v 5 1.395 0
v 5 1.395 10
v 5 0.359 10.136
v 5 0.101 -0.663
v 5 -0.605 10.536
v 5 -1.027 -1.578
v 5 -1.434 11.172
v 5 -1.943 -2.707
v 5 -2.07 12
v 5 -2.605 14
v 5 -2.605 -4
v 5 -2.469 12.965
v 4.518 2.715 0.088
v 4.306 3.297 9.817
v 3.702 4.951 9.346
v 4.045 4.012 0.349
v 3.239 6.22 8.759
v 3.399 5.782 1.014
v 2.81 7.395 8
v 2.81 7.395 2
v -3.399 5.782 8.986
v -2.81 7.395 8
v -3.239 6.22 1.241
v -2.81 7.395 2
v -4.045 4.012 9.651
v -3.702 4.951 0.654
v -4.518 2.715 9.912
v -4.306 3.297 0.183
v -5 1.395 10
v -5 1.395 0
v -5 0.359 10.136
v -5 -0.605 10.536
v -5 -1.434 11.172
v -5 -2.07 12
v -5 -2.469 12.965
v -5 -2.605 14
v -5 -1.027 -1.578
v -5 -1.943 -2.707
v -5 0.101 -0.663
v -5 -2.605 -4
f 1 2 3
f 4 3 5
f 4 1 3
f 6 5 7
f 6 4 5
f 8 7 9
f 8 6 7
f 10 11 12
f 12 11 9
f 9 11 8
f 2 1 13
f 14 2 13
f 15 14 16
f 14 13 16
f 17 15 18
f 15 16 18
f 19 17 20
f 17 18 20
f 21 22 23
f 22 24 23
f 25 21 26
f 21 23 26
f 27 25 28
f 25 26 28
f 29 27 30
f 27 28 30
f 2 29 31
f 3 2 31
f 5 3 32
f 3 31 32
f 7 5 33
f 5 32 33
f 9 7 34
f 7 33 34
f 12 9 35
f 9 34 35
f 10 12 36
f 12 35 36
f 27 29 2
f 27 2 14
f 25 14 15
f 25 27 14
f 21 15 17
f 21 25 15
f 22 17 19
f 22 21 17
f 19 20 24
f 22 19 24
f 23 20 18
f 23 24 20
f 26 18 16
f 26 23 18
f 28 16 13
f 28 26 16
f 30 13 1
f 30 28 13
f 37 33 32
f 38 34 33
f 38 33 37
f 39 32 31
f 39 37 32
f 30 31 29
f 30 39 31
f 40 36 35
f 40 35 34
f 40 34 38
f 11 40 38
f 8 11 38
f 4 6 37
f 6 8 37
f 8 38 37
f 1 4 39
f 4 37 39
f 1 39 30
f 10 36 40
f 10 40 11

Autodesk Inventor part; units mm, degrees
ref_plane "YZ Plane" through (0, 0, 0) normal (1, 0, 0) x (0, 1, 0)
ref_plane "XZ Plane" through (0, 0, 0) normal (0, 1, 0) x (-1, 0, 0)
ref_plane "XY Plane" through (0, 0, 0) normal (0, 0, 1) x (1, 0, 0)
sketch "Sketch1" plane through (0, 0, 0) normal (0, 0, 1) x (1, 0, 0)
  line L0 (-5, -2.6054) -> (-5, 1.3946)
  line L1 (-5, -2.6054) -> (0, -2.6054)
  line L2 (0, -2.6054) -> (0, 7.3946)
  line L3 (0, 7.3946) -> (-2.8105, 7.3946)
  line L4 (-2.8105, 7.3946) -> (-5, 1.3946)
  point P0 (0, 0)
  dimension "d0" = 4
  dimension "d1" = 6
  dimension "d2" = 5
extrude "Extrusion1" add sketch "Sketch1" along normal blind 10
mirror "Mirror1" about plane through (0, 0, 0) normal (1, 0, 0) of "Extrusion1"
sketch "Sketch2" plane through (0, 0, 0) normal (1, 0, 0) x (0, 1, 0)
  line L0 (7.3946, 0) -> (7.3946, 10) projected
  line L1 (7.3946, 10) -> (1.3946, 10) projected
  line L2 (1.3946, 0) -> (1.3946, 10) projected
  arc A0 (7.3946, 8) -> (1.3946, 10) centre (1.3946, 0) ccw
  line L3 (7.3946, 0) -> (1.3946, 0) projected
  arc A1 (1.3946, 0) -> (7.3946, 2) centre (1.3946, 10) ccw
  point P0 (0, 0)
  dimension "d7" = 10
  dimension "d8" = 8
  dimension "d11" = 10
  dimension "d12" = 8
extrude "Extrusion3" cut sketch "Sketch2" along normal mid plane 10 contours L3 A1 L0 | A0 L1 L0
sketch "Sketch3" plane through (0, 0, 0) normal (1, 0, 0) x (0, 1, 0)
  line L0 (-2.6054, 0) -> (-2.6054, 10) projected
  line L1 (-2.6054, 10) -> (-2.6054, 14)
  line L2 (1.3946, 0) -> (1.3946, 10) projected
  arc A0 (-2.6054, 14) -> (1.3946, 10) centre (1.3946, 14) ccw
  line L3 (-2.6054, 0) -> (-2.6054, -4)
  line L4 (1.3946, 0) -> (-2.6054, 0) projected
  arc A1 (1.3946, 0) -> (-2.6054, -4) centre (3.9223, -6.5277) ccw
  arc A2 (7.3946, 8) -> (1.3946, 10) centre (1.3946, 0) ccw projected
  point P0 (0, 0)
  dimension "d15" = 4
  dimension "d17" = 7
  dimension "d18" = 4
extrude "Extrusion4" add sketch "Sketch3" along normal mid plane 10
equation "\"d2\" = rack_tooth_thickness"
equation "\"d3\" = rack_tooth_face_widh"
equation "\"d11\" = d7"
equation "\"d12\" = d8"
equation "\"d17\" = d16"
equation "\"d18\" = d15"
equation "\"rack_tooth_thickness\" = 5"
equation "\"rack_tooth_face_widh\" = 10"
equation "\"rack_tooth_addendum\" = 5"
equation "\"rack_tooth_dedendum\" = 5"
equation "\"hoop_width_large\" = 51"
equation "\"hoop_thickness_large\" = 4"
equation "\"hoop_thickness_small\" = 2"
equation "\"hoop_width_medium\" = 33.7"
equation "\"hoop_thickness_medium\" = 3.2"
equation "\"hoop_width_small\" = 25.4"
equation "\"secure_arm_angle\" = 35deg"
equation "\"secure_arm_radii\" = 9"
equation "\"hoop_bearing_length\" = 5deg"
equation "\"hoop_cable_pulley_diam\" = 22"
equation "\"hoop_cable_diam\" = 5"
equation "\"support_frame_squareBarThickness\" = 5"
equation "\"support_frame_squareBarFillet\" = 2"
equation "\"support_baseClamp_platformThickness\" = 15"
equation "\"support_baseClamp_platformWidthBuffer\" = 0"
equation "\"support_baseClamp_platformLengthBuffer\" = 35"
equation "\"support_frame_endHoleBuffer\" = 45"
equation "\"support_baseClamp_thickness\" = 8"
equation "\"support_baseClamp_sleeveSweepTerminationAngle\" = 55deg"
equation "\"support_baseClamp_sleeveHoleDiameter\" = 12"
equation "\"hoop_angle_z\" = 45deg"
equation "\"hoop_tabs_hole\" = 12"
equation "\"hoop_tabs_thickness\" = 6"
equation "\"wheelchair_deployed_width\" = 635"
equation "\"wheelchair_deployed_height\" = 914"
equation "\"wheelchair_deployed_length\" = 1067"
equation "\"sm_varx_member_tolerance\" = 0"
equation "\"sm_varx_pinPlate_holeDiameter\" = 5"
equation "\"sm_varx_pinPlate_thickness\" = 5"
equation "\"sm_varx_squareBarThickness\" = 2.5"
equation "\"hoop_bushing12_radialInterference\" = 0"
equation "\"hoop_bushing12_od\" = -2 * hoop_thickness_large + hoop_width_large + hoop_bushing12_radialInterference"
equation "\"hoop_bushing23_radialInterference\" = 0"
equation "\"hoop_bushing12_thickness\" = -hoop_width_medium + hoop_bushing12_od - 2 * hoop_bushing12_radialInterference"
equation "\"hoop_bushing23_od\" = -2 * hoop_thickness_medium + hoop_width_medium + hoop_bushing23_radialInterference"
equation "\"hoop_bushing23_thickness\" = -hoop_width_small + hoop_bushing23_od - 2 * hoop_bushing23_radialInterference"
equation "\"wheelchatir_pos_deploy_angle_0\" = 65deg"
equation "\"wheelchatir_pos_store_angle_0\" = 90deg"
equation "\"wheelchatir_pos_deploy_angle_1\" = 20deg"
equation "\"wheelchatir_pos_store_angle_1\" = 20deg"
equation "\"d16\" = 7"
properties part number "tooth" material "Steel, High Strength, Low Alloy"
